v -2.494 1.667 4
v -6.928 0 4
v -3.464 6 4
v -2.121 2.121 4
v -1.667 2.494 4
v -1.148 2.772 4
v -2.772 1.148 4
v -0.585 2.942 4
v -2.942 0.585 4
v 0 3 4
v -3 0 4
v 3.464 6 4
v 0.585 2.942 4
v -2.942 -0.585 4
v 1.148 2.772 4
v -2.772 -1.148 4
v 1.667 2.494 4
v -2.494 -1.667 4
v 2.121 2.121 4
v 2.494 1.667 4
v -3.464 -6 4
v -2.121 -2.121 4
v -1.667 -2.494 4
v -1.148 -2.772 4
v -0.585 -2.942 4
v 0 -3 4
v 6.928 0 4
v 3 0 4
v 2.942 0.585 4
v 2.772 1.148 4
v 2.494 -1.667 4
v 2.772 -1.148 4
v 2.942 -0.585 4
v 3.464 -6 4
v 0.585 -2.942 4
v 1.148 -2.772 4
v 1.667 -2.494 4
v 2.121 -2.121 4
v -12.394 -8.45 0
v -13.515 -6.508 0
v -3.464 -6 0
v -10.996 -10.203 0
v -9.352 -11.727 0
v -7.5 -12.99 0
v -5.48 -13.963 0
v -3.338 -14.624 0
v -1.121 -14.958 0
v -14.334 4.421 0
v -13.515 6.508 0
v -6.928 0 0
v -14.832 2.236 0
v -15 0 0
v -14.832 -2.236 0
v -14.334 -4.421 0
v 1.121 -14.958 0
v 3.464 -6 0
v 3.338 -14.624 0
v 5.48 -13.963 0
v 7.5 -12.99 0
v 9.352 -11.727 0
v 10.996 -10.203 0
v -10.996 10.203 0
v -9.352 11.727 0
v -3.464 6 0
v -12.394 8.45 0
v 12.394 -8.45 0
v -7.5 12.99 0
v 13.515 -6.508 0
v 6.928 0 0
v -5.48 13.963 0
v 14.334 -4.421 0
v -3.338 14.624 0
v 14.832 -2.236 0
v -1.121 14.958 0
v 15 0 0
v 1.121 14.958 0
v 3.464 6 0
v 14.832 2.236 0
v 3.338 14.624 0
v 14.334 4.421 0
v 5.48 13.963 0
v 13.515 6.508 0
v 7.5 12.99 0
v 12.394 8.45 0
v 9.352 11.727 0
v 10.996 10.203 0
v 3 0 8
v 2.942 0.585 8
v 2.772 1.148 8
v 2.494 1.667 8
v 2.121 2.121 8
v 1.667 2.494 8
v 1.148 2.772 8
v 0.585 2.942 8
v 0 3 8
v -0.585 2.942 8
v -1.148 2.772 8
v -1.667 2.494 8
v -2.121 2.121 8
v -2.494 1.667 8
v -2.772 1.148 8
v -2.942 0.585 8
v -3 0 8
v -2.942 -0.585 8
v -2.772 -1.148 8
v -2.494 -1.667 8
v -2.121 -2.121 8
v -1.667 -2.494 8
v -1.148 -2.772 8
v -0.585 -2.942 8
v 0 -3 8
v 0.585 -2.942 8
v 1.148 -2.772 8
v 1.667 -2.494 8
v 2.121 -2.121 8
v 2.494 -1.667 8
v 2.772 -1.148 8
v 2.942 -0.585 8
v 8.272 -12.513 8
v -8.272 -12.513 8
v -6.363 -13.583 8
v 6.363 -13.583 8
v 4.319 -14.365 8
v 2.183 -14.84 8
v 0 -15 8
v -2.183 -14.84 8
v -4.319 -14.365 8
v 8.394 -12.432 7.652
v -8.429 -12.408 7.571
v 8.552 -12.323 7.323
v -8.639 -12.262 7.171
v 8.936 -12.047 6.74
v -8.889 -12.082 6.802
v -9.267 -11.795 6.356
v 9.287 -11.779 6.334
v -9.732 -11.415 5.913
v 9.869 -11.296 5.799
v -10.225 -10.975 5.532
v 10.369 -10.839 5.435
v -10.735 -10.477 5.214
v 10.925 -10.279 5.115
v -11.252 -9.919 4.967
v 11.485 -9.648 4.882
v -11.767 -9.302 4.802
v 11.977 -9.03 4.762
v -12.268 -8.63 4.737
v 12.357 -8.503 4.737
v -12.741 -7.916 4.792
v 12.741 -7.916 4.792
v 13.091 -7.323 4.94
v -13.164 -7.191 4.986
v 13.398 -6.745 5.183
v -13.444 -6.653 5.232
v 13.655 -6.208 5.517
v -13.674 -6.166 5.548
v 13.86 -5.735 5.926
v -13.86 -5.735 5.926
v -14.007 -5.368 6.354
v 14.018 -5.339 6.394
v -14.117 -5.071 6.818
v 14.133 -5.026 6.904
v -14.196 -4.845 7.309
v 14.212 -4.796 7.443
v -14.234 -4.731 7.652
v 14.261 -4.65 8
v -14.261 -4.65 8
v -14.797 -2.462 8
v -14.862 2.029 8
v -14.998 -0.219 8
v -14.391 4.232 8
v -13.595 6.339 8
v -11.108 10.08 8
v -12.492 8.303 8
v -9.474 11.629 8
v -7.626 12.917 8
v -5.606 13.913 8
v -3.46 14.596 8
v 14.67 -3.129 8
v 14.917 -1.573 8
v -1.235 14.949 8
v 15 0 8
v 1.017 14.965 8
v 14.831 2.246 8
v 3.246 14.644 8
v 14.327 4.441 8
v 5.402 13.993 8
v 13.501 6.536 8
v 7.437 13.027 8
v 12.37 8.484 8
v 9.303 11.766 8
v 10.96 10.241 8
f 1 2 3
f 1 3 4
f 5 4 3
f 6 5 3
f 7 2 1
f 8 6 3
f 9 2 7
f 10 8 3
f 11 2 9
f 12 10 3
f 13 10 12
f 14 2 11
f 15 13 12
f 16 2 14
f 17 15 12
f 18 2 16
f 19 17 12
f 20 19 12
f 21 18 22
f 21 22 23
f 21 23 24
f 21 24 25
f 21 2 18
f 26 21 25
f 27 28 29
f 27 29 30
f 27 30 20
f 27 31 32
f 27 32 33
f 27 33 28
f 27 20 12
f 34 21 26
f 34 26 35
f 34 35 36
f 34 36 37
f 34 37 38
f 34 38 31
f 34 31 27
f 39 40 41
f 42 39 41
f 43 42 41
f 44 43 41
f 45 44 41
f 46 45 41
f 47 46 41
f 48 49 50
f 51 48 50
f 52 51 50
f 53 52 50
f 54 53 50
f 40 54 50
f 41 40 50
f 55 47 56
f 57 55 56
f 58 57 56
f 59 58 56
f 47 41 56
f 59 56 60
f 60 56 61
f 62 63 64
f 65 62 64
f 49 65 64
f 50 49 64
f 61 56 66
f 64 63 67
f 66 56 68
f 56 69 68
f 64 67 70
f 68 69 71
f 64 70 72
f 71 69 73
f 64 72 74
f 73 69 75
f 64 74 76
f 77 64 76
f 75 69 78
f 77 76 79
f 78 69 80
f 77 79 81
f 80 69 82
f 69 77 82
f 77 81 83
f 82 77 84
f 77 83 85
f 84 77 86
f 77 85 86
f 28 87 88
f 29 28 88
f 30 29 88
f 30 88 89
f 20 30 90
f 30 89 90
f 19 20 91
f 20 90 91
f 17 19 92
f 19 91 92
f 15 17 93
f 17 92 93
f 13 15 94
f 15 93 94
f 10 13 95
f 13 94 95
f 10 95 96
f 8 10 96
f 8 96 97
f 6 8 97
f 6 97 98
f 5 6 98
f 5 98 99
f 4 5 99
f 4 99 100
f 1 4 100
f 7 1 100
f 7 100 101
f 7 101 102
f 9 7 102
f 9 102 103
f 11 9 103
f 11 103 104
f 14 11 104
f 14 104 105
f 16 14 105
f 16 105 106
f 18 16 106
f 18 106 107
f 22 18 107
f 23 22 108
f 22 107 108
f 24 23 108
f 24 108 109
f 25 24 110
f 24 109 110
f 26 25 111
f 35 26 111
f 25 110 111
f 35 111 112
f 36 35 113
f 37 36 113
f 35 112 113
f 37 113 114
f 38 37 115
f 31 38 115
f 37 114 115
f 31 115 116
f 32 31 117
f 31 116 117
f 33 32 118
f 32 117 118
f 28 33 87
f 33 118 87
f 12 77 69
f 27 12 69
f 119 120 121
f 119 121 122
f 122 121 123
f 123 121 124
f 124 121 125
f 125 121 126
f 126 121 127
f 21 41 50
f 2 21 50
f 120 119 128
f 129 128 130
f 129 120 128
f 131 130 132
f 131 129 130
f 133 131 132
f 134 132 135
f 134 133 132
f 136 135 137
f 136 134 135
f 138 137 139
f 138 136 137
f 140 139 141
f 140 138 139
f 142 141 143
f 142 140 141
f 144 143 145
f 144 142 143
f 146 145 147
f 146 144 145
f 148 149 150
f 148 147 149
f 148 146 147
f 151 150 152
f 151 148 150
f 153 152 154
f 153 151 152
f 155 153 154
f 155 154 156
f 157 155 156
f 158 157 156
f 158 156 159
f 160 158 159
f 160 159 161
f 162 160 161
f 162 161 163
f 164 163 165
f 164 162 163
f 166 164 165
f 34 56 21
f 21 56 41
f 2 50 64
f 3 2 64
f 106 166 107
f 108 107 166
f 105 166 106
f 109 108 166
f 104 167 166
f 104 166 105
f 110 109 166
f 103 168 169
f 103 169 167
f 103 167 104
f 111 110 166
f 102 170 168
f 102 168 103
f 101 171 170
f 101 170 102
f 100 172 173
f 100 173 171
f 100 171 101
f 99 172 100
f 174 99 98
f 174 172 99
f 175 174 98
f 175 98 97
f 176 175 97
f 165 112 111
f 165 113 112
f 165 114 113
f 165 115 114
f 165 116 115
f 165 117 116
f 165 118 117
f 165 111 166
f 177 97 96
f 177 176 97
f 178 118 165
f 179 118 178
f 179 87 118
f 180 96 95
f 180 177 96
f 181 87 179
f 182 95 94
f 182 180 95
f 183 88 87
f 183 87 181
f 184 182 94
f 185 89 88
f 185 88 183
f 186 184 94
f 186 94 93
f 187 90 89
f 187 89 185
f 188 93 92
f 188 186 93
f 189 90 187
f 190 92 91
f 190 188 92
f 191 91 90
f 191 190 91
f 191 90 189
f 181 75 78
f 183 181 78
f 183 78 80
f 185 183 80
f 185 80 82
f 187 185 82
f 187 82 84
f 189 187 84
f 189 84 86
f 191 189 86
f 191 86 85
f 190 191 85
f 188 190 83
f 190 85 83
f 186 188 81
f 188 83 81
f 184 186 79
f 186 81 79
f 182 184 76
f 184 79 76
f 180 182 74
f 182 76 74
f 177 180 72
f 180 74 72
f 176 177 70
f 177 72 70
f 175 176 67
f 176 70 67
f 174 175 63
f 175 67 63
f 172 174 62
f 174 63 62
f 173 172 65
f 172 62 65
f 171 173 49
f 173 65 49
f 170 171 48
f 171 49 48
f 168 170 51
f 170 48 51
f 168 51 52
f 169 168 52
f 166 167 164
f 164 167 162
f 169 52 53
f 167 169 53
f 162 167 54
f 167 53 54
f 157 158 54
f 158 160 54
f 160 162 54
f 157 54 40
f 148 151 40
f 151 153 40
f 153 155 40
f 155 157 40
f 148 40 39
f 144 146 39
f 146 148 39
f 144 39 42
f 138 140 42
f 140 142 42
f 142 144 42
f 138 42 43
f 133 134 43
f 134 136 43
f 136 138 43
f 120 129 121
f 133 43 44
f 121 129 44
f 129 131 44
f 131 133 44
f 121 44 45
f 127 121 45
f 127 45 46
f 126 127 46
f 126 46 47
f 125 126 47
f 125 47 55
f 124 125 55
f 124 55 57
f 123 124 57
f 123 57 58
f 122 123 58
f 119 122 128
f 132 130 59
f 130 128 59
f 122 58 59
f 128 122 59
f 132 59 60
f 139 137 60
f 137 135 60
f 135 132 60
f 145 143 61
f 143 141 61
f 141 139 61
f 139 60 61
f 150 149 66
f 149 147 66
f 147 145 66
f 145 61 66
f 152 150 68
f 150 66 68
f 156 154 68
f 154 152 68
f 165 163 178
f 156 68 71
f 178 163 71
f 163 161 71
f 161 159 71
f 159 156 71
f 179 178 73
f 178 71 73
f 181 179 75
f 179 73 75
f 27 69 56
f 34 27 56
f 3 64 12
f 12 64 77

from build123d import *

# Parameters (mm, degrees)
CYLINDER001_R           = 4
CYLINDER001_DEPTH       = 70
CYLINDER001_PITCH_ANGLE = 90
CYLINDER_R              = 15
CYLINDER_DEPTH          = 8
SKETCH_R                = 3
POCKET_DEPTH            = 8.001
POCKET001_DEPTH         = 4


with BuildPart() as cylinder001:
    # Cylinder001 → Cylinder001 (new body)
    with BuildSketch(Plane.XY):
        Circle(CYLINDER001_R)
    extrude(amount=CYLINDER001_DEPTH)


with BuildPart() as cylinder001_1:
    # Cylinder001 pitch: moved
    add(cylinder001.part.rotate(Axis((0, 0, 0), (0, 1, 0)), CYLINDER001_PITCH_ANGLE))


with BuildPart() as cylinder001_2:
    # Cylinder001 placement: moved
    add(cylinder001_1.part.moved(Location((-35.24, -8.5813, 8.7367))))


with BuildPart() as pocket001:
    # Cylinder → Cylinder (new body)
    with BuildSketch(Plane.XY):
        Circle(CYLINDER_R)
    extrude(amount=CYLINDER_DEPTH)

    # Sketch → Pocket (cut, through all)
    with BuildSketch(Plane.XY.offset(8)):
        Circle(SKETCH_R)
    extrude(amount=-POCKET_DEPTH, mode=Mode.SUBTRACT)

    # Cut: cut Cylinder001
    add(cylinder001_2.part, mode=Mode.SUBTRACT)

    # Sketch001 → Pocket001 (cut)
    with BuildSketch(Plane(origin=(0, 0, 0), x_dir=(1, 0, 0), z_dir=(0, 0, -1))):
        Polygon((3.464102, -6), (6.928203, 0), (3.464102, 6), (-3.464102, 6), (-6.928203, 0), (-3.464102, -6), align=None)
    extrude(amount=-POCKET001_DEPTH, mode=Mode.SUBTRACT)


solid = pocket001.part
